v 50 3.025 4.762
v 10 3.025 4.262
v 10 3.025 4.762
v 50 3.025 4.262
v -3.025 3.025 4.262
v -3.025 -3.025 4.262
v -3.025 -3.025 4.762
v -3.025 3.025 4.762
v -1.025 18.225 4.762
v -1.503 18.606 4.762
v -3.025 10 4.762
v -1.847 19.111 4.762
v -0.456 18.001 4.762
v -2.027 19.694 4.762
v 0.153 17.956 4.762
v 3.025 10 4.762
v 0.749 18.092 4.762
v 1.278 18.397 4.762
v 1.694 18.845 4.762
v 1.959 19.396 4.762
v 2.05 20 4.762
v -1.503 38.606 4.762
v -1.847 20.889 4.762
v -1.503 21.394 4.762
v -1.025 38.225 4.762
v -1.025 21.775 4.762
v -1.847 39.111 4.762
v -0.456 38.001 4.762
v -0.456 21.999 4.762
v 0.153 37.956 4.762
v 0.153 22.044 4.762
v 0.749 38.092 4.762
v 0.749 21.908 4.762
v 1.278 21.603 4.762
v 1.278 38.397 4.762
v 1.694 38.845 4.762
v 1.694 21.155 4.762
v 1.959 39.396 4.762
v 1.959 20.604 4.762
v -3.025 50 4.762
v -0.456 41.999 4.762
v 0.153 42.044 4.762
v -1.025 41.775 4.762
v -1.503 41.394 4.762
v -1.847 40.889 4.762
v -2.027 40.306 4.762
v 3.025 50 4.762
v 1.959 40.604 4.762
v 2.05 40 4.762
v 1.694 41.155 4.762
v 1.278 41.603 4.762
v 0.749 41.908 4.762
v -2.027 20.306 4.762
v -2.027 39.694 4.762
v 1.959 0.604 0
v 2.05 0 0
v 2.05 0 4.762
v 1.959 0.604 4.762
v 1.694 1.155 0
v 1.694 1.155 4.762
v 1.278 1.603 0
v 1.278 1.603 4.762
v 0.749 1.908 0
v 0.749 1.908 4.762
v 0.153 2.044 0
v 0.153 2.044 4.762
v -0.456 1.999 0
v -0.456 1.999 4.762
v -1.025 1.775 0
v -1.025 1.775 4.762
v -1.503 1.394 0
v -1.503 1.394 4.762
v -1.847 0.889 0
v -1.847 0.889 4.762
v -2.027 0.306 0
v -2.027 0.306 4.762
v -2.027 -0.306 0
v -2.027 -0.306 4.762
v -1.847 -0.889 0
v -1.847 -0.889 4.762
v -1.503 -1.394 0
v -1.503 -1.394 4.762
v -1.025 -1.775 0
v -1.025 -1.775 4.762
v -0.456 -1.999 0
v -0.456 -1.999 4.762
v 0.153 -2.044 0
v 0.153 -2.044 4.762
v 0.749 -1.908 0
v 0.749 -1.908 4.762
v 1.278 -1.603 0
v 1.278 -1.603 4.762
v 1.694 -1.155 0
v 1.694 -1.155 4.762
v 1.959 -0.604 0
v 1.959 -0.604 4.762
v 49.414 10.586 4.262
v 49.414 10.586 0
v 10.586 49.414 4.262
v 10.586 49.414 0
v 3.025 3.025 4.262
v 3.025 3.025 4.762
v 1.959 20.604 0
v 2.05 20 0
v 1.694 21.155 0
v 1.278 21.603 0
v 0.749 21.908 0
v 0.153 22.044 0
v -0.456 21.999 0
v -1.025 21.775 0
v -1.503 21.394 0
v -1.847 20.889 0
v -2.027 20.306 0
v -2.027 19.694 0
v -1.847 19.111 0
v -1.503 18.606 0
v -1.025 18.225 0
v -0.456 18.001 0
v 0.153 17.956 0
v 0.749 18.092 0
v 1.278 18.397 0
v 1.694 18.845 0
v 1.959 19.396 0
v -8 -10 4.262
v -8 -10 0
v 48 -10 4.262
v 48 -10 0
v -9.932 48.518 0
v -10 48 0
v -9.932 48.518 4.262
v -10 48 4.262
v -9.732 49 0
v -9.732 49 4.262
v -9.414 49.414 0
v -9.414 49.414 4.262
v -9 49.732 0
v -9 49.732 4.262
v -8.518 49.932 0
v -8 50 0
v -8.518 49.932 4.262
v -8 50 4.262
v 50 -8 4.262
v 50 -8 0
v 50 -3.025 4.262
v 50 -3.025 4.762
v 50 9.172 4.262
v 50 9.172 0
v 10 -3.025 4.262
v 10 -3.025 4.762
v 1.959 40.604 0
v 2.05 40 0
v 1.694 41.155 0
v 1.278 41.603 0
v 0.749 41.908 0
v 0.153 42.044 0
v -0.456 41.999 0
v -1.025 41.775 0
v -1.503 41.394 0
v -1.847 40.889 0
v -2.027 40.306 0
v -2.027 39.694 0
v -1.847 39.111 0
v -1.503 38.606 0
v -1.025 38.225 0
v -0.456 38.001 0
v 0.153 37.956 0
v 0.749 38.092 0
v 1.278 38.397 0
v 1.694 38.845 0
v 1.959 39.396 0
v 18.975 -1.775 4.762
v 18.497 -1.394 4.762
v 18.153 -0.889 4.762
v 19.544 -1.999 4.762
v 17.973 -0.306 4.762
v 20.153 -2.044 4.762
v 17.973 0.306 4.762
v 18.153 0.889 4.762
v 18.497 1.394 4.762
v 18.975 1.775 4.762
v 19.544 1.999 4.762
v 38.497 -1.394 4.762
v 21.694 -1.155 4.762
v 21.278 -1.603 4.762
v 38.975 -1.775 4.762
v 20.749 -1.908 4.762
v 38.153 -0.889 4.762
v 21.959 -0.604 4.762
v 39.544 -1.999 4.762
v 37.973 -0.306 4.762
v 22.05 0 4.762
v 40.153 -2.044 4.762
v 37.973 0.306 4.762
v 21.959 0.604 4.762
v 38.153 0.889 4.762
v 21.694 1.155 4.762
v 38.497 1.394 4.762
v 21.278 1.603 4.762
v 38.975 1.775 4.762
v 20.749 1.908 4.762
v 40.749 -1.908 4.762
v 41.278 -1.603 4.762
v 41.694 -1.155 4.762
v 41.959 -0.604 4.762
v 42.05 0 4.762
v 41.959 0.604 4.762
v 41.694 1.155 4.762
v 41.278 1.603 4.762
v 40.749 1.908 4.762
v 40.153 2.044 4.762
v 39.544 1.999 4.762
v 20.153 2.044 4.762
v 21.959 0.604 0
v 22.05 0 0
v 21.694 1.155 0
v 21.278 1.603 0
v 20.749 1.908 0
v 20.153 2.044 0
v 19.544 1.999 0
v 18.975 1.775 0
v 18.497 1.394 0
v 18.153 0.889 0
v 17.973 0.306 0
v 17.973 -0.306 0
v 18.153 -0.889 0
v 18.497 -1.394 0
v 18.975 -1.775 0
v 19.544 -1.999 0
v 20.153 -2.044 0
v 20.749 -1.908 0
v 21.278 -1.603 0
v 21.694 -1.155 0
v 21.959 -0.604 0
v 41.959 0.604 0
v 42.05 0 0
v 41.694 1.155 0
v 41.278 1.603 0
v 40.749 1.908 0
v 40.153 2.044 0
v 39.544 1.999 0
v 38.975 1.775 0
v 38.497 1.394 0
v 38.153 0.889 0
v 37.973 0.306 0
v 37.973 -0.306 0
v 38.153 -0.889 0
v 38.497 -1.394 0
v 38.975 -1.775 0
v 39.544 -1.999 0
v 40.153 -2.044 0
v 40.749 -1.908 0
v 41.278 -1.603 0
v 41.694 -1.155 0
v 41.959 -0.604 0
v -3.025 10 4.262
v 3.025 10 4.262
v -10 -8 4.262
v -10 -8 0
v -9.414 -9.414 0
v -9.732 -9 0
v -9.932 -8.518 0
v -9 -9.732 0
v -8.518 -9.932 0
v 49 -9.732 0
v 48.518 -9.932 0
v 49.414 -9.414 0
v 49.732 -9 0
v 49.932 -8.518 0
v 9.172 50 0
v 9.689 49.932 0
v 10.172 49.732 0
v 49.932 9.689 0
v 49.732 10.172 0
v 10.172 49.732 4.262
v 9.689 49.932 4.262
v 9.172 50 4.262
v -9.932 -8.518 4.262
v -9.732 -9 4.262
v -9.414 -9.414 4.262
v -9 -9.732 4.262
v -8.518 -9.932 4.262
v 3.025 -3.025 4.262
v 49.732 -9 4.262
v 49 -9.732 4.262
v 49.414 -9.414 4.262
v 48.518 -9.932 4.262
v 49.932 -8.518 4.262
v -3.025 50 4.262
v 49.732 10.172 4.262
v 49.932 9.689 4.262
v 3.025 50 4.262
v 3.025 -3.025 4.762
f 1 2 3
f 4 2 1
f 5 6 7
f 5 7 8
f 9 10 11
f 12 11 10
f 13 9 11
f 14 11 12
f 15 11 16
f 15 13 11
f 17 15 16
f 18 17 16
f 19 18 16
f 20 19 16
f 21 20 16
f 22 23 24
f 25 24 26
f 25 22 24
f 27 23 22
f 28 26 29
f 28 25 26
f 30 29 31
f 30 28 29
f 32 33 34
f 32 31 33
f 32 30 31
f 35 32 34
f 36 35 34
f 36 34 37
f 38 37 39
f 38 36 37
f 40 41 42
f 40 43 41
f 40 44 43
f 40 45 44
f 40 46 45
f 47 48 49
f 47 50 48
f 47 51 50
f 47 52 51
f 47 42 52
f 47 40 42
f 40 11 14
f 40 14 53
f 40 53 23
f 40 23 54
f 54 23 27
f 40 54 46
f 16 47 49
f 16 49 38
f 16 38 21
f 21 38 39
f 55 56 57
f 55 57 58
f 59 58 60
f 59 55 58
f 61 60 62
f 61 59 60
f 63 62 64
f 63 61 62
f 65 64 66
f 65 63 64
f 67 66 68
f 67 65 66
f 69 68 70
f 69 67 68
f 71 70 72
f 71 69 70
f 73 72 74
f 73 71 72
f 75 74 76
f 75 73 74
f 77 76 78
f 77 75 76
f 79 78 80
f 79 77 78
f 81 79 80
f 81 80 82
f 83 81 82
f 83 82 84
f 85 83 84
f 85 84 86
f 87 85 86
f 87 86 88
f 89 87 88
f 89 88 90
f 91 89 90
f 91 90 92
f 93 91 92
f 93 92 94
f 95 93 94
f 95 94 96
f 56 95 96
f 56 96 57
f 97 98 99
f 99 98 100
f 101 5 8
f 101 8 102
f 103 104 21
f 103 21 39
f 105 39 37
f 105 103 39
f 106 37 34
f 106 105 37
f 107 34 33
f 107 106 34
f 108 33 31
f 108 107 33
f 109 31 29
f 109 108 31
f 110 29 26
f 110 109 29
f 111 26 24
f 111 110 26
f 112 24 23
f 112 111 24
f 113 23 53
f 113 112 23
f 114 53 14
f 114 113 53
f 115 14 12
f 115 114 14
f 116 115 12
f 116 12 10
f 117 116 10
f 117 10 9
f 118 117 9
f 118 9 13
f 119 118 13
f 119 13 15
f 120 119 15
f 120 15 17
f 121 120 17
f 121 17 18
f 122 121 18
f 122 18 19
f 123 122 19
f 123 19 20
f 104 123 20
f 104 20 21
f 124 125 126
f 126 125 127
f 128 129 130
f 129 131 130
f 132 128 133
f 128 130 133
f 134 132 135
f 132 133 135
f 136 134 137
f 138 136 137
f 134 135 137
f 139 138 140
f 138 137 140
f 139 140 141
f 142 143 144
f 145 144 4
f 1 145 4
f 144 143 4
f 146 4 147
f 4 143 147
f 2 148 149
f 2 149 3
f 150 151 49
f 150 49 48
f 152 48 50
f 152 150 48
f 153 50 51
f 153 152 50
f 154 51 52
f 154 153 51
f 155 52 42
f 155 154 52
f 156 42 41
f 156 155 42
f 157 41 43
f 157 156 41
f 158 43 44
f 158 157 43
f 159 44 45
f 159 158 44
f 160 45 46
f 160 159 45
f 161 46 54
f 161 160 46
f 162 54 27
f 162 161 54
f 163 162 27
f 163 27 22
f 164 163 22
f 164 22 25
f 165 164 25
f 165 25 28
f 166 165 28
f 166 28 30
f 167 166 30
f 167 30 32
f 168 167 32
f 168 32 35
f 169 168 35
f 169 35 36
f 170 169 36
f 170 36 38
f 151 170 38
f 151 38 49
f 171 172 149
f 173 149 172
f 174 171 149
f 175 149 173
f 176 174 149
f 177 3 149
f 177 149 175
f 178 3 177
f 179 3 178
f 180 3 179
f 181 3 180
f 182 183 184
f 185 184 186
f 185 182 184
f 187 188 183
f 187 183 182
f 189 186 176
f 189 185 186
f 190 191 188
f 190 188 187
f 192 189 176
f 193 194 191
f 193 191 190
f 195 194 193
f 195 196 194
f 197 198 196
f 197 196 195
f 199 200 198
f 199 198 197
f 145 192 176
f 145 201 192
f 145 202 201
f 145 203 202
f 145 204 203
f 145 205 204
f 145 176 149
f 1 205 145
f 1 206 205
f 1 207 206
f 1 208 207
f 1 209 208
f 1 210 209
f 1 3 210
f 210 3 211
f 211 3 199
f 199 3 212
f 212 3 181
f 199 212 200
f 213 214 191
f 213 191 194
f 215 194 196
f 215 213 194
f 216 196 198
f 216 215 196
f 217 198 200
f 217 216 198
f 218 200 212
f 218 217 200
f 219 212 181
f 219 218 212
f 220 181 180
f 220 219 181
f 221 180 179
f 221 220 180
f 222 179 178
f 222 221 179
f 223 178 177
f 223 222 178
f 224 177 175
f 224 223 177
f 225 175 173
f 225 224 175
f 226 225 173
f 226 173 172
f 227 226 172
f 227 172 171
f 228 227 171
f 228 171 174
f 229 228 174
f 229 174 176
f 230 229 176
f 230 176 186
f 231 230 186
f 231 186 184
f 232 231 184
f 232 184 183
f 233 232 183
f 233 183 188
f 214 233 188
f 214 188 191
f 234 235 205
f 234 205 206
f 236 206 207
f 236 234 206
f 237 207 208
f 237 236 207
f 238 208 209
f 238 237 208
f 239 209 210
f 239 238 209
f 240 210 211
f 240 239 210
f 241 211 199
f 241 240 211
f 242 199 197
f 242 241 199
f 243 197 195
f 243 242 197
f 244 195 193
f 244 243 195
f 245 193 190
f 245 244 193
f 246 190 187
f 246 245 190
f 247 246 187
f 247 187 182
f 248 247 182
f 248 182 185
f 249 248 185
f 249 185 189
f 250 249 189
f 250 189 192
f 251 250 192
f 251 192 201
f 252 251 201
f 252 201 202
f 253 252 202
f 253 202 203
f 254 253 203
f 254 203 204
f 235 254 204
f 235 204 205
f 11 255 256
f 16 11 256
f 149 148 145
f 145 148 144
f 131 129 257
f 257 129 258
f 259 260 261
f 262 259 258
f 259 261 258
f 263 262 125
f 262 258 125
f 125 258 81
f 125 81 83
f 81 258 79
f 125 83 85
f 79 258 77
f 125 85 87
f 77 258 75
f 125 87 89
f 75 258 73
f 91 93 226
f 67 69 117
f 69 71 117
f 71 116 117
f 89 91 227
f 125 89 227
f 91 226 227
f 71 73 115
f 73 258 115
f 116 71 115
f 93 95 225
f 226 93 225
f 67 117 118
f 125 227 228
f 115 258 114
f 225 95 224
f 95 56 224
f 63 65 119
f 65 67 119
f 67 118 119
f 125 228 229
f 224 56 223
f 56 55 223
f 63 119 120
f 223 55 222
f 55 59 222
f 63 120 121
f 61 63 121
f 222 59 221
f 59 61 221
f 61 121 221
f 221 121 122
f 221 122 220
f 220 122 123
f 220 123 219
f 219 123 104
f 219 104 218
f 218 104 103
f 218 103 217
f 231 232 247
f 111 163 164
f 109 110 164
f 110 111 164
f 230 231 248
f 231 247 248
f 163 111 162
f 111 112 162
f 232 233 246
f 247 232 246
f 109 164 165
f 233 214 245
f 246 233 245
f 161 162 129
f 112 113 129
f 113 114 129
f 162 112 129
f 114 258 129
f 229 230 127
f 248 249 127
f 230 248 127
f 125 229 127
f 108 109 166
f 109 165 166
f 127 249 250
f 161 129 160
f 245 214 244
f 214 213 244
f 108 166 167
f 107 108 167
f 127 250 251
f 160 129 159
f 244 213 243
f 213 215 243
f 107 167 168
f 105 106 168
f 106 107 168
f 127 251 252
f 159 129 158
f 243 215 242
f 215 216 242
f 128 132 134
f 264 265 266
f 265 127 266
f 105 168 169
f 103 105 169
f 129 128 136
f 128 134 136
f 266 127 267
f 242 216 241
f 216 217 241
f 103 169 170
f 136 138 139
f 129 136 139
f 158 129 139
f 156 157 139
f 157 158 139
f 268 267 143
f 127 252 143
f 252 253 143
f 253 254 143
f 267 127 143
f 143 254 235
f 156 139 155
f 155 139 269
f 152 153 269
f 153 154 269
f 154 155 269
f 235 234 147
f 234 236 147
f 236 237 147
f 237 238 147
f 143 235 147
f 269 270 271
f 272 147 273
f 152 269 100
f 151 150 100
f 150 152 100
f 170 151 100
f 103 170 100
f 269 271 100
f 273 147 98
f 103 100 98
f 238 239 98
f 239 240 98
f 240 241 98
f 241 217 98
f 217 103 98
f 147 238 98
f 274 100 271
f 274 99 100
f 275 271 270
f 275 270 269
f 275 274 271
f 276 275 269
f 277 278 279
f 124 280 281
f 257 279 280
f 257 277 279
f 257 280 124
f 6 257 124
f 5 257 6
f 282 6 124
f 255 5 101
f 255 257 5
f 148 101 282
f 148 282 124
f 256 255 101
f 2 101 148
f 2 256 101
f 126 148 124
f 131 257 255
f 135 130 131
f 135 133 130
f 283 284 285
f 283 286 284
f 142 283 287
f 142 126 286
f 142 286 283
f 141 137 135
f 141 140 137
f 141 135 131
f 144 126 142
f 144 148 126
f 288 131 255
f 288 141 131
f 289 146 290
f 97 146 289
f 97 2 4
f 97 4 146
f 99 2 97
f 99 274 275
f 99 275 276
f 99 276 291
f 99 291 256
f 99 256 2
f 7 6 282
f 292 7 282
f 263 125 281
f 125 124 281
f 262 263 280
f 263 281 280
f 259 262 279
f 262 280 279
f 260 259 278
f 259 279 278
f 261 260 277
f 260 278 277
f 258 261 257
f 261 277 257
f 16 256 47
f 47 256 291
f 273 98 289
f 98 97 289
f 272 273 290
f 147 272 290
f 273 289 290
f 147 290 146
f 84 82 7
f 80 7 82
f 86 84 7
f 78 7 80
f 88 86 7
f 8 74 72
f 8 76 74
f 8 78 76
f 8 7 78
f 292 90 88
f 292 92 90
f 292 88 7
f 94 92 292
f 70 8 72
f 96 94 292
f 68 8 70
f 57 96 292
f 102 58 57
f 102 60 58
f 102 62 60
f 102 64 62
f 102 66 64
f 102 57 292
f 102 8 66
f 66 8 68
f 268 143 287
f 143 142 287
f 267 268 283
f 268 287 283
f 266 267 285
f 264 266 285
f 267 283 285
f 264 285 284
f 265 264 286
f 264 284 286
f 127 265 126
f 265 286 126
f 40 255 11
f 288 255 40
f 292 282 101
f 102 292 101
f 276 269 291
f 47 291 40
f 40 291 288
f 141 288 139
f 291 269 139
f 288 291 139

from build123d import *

# Parameters (mm, degrees)
F2_W     = 6.975
F2_H     = 40
F2_H_2   = 6.975
F2_W_2   = 6.05
F2_R     = 2.05
F2_H_3   = 6.05
F2_W_3   = 40
F3_DEPTH = 4.2625
F4_DEPTH = 4.7625
F5_R     = 2


with BuildPart() as f3:
    # F2 (on Top) → F3 (new body)
    with BuildSketch(Plane.XY):
        with Locations((-6.5125, 30)):
            Rectangle(F2_W, F2_H)
        with Locations((-6.5125, 6.5125)):
            Rectangle(F2_W, F2_H_2)
        with Locations((0, 30)):
            Rectangle(F2_W_2, F2_H)
        with Locations((0, 20)):
            Circle(F2_R, mode=Mode.SUBTRACT)
        with Locations((0, 40)):
            Circle(F2_R, mode=Mode.SUBTRACT)
        with Locations((-6.5125, 0)):
            Rectangle(F2_W, F2_H_3)
        with Locations((6.5125, 30)):
            Rectangle(F2_W, F2_H)
        with Locations((-6.5125, -6.5125)):
            Rectangle(F2_W, F2_H_2)
        Polygon((50, 10), (10, 50), (10, 10), align=None)
        with Locations((0, -6.5125)):
            Rectangle(F2_W_2, F2_H_2)
        with Locations((30, 6.5125)):
            Rectangle(F2_W_3, F2_H_2)
        with Locations((6.5125, -6.5125)):
            Rectangle(F2_W, F2_H_2)
        with Locations((30, 0)):
            Rectangle(F2_W_3, F2_H_3)
        with Locations((20, 0)):
            Circle(F2_R, mode=Mode.SUBTRACT)
        with Locations((40, 0)):
            Circle(F2_R, mode=Mode.SUBTRACT)
        with Locations((30, -6.5125)):
            Rectangle(F2_W_3, F2_H_2)
        with Locations((6.5125, 6.5125)):
            Rectangle(F2_W, F2_H_2)
        with Locations((6.5125, 0)):
            Rectangle(F2_W, F2_H_3)
        Rectangle(F2_W_2, F2_H_3)
        Circle(F2_R, mode=Mode.SUBTRACT)
        with Locations((0, 6.5125)):
            Rectangle(F2_W_2, F2_H_2)
    extrude(amount=F3_DEPTH)

    # F2 (on Top) → F4 (join)
    with BuildSketch(Plane.XY):
        Rectangle(F2_W_2, F2_H_3)
        Circle(F2_R, mode=Mode.SUBTRACT)
        with Locations((30, 0)):
            Rectangle(F2_W_3, F2_H_3)
        with Locations((20, 0)):
            Circle(F2_R, mode=Mode.SUBTRACT)
        with Locations((40, 0)):
            Circle(F2_R, mode=Mode.SUBTRACT)
        with Locations((0, 30)):
            Rectangle(F2_W_2, F2_H)
        with Locations((0, 20)):
            Circle(F2_R, mode=Mode.SUBTRACT)
        with Locations((0, 40)):
            Circle(F2_R, mode=Mode.SUBTRACT)
    extrude(amount=F4_DEPTH)

    # F5
    f5_edges = [f3.edges().sort_by_distance(p)[0] for p in [
        (50, 10, 2.13125),
        (50, -10, 2.13125),
        (-10, -10, 2.13125),
        (-10, 50, 2.13125),
        (10, 50, 2.13125),
    ]]
    fillet(f5_edges, radius=F5_R)


solid = f3.part
